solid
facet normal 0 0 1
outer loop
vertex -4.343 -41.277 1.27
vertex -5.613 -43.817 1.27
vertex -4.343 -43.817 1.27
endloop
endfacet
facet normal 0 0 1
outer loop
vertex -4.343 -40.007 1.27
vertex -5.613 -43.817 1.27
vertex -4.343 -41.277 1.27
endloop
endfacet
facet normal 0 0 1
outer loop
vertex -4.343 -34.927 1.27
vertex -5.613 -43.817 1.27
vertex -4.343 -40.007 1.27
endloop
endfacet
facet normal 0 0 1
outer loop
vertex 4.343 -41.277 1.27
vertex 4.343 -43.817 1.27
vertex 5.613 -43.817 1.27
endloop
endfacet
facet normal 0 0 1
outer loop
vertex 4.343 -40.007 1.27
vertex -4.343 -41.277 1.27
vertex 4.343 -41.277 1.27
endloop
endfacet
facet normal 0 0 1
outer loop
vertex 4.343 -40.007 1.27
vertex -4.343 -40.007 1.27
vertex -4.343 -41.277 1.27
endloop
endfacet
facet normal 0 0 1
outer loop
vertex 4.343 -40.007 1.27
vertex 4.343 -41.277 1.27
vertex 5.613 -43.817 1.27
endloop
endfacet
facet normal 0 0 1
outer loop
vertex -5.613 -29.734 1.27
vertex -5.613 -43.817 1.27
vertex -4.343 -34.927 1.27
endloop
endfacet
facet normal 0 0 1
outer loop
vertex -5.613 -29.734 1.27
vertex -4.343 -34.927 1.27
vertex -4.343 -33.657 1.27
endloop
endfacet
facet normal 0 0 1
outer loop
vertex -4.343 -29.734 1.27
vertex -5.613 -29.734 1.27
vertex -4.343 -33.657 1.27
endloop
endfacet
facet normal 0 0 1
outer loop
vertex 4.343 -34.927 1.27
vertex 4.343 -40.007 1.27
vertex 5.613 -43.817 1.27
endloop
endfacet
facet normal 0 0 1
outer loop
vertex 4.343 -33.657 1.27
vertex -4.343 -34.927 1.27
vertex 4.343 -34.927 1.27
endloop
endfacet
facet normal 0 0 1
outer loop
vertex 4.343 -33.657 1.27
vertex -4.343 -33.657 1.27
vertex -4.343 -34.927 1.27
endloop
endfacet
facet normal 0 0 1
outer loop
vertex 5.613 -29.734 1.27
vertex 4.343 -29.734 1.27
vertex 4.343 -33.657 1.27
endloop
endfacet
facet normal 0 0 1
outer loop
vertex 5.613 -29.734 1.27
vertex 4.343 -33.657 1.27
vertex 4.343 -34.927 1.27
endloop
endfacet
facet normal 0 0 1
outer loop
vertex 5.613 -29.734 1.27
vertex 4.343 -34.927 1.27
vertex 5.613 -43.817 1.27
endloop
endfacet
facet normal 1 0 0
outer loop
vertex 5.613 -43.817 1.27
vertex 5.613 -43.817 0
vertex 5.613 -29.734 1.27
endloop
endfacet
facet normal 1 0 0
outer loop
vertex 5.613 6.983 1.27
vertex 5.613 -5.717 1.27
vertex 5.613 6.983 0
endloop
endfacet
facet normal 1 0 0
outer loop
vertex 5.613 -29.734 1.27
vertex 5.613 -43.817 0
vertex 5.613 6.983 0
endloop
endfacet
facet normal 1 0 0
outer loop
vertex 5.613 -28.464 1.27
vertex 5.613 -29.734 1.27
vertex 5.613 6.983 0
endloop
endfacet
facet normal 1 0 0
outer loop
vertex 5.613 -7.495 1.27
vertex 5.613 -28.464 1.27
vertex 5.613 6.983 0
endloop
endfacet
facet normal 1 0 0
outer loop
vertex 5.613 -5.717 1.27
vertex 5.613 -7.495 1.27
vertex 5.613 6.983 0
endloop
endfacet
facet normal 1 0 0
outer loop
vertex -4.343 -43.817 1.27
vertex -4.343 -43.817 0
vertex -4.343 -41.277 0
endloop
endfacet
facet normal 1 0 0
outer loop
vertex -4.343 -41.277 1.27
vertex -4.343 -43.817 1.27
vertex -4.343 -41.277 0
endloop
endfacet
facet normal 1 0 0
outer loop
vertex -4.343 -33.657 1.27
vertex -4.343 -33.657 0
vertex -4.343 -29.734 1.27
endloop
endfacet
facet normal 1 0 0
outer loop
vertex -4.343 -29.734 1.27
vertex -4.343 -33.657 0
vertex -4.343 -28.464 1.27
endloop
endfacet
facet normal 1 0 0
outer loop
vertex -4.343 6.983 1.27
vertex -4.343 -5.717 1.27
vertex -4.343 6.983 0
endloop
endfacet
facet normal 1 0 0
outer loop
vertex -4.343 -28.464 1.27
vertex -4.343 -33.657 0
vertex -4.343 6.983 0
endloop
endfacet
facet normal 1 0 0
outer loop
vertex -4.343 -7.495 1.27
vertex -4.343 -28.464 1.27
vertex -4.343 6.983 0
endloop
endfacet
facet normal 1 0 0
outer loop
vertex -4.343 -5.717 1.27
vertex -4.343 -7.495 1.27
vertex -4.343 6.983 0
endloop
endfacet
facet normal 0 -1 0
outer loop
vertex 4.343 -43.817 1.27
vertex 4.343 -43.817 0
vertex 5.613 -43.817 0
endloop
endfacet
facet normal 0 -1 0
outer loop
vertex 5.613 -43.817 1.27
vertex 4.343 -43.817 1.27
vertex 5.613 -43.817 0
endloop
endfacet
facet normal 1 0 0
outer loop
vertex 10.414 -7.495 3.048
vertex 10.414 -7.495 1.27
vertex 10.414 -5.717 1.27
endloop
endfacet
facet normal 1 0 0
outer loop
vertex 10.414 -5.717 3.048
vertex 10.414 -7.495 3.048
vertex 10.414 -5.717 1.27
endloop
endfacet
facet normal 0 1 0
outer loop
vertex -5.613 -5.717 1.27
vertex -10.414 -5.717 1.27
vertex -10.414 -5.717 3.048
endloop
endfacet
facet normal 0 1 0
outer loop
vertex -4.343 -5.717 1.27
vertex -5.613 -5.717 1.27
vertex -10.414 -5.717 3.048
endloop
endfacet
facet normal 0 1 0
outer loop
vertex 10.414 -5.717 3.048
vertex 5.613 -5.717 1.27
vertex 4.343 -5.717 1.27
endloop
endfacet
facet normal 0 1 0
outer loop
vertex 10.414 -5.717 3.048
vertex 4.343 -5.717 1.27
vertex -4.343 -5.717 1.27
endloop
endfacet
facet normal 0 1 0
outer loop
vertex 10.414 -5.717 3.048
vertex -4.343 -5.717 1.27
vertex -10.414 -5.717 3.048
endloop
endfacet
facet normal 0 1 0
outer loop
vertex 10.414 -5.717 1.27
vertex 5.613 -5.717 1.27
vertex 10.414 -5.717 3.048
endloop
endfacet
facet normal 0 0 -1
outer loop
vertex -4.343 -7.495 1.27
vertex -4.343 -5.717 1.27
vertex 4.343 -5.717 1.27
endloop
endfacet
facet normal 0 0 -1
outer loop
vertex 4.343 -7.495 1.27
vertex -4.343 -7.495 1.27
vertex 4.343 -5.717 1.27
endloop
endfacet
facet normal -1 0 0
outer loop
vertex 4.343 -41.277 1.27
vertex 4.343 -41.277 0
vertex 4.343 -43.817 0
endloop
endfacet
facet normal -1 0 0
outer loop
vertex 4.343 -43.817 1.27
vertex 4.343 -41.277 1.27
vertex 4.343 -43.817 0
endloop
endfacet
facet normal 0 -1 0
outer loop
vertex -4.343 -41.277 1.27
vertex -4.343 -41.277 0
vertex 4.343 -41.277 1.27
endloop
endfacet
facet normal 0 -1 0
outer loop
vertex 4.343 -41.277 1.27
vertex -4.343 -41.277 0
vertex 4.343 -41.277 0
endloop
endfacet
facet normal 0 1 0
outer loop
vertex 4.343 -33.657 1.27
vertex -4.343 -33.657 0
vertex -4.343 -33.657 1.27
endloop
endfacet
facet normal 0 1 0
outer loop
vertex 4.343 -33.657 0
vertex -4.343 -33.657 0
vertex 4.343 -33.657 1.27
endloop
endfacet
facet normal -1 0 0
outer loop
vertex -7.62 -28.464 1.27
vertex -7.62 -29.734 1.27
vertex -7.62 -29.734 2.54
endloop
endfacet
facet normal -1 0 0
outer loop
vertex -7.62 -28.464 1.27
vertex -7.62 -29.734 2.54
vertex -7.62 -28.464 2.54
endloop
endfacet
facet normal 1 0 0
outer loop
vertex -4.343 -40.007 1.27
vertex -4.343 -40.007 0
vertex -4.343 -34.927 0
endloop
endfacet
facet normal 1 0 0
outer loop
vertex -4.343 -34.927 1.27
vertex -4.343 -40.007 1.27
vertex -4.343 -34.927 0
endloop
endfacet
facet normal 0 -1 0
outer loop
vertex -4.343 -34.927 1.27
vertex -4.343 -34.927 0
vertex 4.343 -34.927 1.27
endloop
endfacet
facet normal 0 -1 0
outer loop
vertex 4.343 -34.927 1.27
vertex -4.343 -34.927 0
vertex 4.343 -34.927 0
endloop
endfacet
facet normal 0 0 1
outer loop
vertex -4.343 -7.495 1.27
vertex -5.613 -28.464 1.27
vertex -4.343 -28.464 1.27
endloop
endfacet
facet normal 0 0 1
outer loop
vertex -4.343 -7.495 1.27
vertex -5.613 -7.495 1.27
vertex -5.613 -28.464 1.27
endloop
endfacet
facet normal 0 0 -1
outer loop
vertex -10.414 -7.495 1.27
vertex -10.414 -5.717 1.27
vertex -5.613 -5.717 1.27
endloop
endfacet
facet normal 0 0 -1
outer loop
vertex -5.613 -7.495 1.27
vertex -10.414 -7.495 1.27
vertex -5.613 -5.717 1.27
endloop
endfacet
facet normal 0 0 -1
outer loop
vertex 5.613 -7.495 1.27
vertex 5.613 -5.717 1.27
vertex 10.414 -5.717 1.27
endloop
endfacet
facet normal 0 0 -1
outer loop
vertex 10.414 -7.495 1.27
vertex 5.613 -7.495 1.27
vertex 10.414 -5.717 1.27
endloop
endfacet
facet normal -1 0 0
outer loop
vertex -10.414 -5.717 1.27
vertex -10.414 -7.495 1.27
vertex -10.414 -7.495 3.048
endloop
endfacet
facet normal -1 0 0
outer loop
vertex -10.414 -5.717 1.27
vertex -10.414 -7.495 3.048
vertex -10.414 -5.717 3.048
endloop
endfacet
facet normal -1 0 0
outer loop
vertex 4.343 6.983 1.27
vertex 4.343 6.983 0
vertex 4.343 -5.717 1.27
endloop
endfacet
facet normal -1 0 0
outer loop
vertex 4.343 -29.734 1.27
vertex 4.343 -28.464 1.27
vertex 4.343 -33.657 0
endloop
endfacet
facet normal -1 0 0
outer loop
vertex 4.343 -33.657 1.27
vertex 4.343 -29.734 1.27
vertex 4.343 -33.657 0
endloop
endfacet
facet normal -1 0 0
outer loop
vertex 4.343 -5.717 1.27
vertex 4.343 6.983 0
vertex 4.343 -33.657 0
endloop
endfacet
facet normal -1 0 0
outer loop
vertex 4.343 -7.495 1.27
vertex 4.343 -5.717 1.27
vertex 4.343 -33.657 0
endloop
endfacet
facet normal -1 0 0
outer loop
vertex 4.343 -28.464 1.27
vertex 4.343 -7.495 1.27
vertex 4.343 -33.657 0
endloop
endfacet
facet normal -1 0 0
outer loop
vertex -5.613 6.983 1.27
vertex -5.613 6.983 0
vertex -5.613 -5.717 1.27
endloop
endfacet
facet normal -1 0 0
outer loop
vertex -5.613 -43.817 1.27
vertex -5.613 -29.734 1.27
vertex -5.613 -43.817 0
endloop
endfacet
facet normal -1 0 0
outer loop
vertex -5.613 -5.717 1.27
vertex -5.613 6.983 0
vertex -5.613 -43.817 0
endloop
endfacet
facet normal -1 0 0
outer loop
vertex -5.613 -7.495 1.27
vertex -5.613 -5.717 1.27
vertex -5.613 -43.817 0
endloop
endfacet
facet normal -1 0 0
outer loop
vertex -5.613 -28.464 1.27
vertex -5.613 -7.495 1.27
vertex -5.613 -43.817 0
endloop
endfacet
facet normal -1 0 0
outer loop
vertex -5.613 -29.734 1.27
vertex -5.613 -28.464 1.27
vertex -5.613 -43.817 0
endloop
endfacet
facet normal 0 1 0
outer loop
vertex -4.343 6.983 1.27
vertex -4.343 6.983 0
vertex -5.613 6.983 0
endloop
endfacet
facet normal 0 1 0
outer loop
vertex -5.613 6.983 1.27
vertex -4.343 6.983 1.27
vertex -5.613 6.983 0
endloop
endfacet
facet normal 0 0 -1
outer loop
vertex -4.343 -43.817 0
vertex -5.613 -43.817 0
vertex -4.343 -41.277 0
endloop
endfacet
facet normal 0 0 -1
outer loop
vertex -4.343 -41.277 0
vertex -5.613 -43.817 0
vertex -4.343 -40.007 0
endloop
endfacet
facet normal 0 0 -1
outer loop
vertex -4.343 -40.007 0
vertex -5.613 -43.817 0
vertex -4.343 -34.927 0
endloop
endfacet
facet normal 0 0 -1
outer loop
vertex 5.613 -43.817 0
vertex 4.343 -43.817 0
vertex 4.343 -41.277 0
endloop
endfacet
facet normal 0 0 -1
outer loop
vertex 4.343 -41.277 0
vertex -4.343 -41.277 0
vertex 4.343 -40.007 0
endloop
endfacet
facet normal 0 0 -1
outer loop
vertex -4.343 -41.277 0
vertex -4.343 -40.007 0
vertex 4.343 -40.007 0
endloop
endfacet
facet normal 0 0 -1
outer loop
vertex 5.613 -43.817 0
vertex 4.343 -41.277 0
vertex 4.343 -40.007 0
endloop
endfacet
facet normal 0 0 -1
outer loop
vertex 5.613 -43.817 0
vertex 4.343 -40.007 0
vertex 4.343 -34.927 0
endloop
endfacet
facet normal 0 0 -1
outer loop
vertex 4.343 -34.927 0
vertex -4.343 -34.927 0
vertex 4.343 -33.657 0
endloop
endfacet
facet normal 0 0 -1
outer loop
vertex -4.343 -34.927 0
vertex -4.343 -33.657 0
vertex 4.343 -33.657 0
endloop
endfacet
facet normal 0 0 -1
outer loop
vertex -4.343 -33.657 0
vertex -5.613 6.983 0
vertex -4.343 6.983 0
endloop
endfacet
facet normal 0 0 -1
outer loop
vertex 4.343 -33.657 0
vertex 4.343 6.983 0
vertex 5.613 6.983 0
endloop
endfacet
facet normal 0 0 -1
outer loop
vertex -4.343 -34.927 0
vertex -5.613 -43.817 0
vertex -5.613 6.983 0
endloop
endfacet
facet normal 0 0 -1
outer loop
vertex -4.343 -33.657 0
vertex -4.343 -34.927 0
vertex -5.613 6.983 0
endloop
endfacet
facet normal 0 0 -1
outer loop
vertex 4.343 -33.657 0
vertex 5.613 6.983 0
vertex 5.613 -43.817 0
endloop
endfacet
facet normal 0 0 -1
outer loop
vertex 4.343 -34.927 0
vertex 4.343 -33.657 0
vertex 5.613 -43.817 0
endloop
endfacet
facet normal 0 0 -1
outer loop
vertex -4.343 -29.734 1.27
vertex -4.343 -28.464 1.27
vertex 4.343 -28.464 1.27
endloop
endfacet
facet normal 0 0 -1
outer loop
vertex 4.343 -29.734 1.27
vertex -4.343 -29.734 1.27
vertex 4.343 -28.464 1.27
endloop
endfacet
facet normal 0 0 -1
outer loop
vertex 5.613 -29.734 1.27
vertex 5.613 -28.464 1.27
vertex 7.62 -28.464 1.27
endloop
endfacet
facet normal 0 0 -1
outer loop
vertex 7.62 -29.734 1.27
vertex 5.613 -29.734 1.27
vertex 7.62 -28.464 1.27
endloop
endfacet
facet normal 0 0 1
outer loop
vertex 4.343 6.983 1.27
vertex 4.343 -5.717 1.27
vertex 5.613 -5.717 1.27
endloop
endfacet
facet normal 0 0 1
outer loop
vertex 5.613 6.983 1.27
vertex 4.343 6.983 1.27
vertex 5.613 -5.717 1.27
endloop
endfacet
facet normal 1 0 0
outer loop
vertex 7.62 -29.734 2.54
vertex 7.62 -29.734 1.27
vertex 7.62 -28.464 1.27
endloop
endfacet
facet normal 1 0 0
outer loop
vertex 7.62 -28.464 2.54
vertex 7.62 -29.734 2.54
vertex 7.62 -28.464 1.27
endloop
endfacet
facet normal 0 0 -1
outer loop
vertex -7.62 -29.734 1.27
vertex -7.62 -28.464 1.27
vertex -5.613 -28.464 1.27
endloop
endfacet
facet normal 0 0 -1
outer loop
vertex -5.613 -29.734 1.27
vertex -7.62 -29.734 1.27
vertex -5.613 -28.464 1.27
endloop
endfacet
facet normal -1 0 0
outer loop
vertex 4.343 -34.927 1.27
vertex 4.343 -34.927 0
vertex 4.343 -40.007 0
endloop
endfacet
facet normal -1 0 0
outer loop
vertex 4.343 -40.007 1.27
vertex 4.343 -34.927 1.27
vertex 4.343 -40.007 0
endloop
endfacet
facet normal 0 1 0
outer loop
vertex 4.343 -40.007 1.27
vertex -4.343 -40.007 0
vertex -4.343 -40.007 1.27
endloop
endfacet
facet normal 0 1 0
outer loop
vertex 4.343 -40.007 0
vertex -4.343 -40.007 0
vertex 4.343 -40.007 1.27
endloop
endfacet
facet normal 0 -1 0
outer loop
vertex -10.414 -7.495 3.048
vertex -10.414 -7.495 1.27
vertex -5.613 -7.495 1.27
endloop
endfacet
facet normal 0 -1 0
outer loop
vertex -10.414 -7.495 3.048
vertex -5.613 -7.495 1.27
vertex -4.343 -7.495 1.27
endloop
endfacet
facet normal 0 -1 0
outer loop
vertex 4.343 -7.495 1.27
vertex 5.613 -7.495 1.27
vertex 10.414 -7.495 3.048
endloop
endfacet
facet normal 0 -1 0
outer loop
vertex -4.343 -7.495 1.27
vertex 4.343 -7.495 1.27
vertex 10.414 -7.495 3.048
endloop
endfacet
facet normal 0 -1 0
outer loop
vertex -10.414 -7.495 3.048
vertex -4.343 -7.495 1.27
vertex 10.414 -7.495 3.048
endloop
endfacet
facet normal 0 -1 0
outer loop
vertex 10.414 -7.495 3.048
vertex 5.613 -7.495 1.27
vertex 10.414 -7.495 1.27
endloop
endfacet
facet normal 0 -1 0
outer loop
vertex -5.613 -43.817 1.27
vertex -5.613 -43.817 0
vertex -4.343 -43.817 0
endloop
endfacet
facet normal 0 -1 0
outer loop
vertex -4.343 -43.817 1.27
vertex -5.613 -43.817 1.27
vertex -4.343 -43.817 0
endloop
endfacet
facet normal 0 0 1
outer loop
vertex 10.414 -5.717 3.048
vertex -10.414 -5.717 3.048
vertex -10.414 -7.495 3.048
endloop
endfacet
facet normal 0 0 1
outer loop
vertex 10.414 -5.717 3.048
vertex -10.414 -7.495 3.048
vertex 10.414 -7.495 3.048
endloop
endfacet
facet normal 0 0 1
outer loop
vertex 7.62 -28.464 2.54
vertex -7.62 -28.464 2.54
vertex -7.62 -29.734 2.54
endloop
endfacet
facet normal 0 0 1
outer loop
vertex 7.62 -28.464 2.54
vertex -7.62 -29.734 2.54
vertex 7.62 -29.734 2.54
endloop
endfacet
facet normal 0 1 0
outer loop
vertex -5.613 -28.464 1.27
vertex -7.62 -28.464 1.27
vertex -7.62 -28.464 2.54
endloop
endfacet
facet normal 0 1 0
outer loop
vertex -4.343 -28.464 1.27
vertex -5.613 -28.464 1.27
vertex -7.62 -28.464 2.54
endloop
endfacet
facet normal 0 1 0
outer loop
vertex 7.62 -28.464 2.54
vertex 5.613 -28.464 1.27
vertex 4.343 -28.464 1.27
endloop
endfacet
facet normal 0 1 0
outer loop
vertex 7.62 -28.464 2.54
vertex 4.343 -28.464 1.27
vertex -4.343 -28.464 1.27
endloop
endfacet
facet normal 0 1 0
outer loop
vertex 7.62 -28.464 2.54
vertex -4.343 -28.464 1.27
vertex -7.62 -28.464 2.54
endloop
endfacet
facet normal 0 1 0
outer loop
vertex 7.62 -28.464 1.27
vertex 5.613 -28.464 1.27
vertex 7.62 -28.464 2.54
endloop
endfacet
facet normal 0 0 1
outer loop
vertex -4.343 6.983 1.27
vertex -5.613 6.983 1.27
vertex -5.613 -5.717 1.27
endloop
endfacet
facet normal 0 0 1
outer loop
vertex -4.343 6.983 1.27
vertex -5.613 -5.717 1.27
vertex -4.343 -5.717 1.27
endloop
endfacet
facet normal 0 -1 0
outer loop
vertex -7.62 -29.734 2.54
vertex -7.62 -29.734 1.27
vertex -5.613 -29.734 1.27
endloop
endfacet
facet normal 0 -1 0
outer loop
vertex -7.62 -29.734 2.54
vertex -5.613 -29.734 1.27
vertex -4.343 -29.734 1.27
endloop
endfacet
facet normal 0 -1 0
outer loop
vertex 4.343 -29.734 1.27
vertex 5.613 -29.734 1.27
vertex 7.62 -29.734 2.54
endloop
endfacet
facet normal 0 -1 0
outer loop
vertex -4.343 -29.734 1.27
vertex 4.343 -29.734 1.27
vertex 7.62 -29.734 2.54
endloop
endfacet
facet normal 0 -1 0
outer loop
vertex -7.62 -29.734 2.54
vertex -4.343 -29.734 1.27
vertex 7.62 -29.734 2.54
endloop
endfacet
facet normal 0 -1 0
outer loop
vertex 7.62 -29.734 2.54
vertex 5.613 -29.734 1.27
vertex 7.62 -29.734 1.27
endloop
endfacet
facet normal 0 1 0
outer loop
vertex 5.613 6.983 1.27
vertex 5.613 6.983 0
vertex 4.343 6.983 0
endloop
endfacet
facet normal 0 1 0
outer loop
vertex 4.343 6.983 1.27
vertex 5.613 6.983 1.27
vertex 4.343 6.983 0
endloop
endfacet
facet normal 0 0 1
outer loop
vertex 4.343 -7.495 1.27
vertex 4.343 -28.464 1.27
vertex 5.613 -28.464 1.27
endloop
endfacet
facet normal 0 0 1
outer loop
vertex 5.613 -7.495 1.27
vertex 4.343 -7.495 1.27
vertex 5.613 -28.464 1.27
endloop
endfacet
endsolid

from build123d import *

# Parameters (mm, degrees)
F0_W     = 8.6868
F0_H     = 1.27
F1_DEPTH = 1.27
F2_W     = 20.828
F2_H     = 1.778
F3_DEPTH = 1.778
F4_W     = 15.24
F4_H     = 1.27
F5_DEPTH = 1.27


with BuildPart() as f1:
    # F0 (on Top) → F1 (new body)
    with BuildSketch(Plane.XY):
        Polygon((-4.3434, 6.983239), (-5.6134, 6.983239), (-5.6134, -43.816761), (-4.3434, -43.816761), (-4.3434, -41.276761), (-4.3434, -40.006761), (-4.3434, -34.926761), (-4.3434, -33.656761), align=None)
        with Locations((0, -34.291761)):
            Rectangle(F0_W, F0_H)
        Polygon((4.3434, 6.983239), (4.3434, -33.656761), (4.3434, -34.926761), (4.3434, -40.006761), (4.3434, -41.276761), (4.3434, -43.816761), (5.6134, -43.816761), (5.6134, 6.983239), align=None)
        with Locations((0, -40.641761)):
            Rectangle(F0_W, F0_H)
    extrude(amount=F1_DEPTH)

    # F2 (on face) → F3 (join)
    with BuildSketch(Plane.XY.offset(1.27)):
        with Locations((0, -6.605761)):
            Rectangle(F2_W, F2_H)
    extrude(amount=F3_DEPTH)

    # F4 (on face) → F5 (join)
    with BuildSketch(Plane.XY.offset(1.27)):
        with Locations((0, -29.099032)):
            Rectangle(F4_W, F4_H)
    extrude(amount=F5_DEPTH)


solid = f1.part
